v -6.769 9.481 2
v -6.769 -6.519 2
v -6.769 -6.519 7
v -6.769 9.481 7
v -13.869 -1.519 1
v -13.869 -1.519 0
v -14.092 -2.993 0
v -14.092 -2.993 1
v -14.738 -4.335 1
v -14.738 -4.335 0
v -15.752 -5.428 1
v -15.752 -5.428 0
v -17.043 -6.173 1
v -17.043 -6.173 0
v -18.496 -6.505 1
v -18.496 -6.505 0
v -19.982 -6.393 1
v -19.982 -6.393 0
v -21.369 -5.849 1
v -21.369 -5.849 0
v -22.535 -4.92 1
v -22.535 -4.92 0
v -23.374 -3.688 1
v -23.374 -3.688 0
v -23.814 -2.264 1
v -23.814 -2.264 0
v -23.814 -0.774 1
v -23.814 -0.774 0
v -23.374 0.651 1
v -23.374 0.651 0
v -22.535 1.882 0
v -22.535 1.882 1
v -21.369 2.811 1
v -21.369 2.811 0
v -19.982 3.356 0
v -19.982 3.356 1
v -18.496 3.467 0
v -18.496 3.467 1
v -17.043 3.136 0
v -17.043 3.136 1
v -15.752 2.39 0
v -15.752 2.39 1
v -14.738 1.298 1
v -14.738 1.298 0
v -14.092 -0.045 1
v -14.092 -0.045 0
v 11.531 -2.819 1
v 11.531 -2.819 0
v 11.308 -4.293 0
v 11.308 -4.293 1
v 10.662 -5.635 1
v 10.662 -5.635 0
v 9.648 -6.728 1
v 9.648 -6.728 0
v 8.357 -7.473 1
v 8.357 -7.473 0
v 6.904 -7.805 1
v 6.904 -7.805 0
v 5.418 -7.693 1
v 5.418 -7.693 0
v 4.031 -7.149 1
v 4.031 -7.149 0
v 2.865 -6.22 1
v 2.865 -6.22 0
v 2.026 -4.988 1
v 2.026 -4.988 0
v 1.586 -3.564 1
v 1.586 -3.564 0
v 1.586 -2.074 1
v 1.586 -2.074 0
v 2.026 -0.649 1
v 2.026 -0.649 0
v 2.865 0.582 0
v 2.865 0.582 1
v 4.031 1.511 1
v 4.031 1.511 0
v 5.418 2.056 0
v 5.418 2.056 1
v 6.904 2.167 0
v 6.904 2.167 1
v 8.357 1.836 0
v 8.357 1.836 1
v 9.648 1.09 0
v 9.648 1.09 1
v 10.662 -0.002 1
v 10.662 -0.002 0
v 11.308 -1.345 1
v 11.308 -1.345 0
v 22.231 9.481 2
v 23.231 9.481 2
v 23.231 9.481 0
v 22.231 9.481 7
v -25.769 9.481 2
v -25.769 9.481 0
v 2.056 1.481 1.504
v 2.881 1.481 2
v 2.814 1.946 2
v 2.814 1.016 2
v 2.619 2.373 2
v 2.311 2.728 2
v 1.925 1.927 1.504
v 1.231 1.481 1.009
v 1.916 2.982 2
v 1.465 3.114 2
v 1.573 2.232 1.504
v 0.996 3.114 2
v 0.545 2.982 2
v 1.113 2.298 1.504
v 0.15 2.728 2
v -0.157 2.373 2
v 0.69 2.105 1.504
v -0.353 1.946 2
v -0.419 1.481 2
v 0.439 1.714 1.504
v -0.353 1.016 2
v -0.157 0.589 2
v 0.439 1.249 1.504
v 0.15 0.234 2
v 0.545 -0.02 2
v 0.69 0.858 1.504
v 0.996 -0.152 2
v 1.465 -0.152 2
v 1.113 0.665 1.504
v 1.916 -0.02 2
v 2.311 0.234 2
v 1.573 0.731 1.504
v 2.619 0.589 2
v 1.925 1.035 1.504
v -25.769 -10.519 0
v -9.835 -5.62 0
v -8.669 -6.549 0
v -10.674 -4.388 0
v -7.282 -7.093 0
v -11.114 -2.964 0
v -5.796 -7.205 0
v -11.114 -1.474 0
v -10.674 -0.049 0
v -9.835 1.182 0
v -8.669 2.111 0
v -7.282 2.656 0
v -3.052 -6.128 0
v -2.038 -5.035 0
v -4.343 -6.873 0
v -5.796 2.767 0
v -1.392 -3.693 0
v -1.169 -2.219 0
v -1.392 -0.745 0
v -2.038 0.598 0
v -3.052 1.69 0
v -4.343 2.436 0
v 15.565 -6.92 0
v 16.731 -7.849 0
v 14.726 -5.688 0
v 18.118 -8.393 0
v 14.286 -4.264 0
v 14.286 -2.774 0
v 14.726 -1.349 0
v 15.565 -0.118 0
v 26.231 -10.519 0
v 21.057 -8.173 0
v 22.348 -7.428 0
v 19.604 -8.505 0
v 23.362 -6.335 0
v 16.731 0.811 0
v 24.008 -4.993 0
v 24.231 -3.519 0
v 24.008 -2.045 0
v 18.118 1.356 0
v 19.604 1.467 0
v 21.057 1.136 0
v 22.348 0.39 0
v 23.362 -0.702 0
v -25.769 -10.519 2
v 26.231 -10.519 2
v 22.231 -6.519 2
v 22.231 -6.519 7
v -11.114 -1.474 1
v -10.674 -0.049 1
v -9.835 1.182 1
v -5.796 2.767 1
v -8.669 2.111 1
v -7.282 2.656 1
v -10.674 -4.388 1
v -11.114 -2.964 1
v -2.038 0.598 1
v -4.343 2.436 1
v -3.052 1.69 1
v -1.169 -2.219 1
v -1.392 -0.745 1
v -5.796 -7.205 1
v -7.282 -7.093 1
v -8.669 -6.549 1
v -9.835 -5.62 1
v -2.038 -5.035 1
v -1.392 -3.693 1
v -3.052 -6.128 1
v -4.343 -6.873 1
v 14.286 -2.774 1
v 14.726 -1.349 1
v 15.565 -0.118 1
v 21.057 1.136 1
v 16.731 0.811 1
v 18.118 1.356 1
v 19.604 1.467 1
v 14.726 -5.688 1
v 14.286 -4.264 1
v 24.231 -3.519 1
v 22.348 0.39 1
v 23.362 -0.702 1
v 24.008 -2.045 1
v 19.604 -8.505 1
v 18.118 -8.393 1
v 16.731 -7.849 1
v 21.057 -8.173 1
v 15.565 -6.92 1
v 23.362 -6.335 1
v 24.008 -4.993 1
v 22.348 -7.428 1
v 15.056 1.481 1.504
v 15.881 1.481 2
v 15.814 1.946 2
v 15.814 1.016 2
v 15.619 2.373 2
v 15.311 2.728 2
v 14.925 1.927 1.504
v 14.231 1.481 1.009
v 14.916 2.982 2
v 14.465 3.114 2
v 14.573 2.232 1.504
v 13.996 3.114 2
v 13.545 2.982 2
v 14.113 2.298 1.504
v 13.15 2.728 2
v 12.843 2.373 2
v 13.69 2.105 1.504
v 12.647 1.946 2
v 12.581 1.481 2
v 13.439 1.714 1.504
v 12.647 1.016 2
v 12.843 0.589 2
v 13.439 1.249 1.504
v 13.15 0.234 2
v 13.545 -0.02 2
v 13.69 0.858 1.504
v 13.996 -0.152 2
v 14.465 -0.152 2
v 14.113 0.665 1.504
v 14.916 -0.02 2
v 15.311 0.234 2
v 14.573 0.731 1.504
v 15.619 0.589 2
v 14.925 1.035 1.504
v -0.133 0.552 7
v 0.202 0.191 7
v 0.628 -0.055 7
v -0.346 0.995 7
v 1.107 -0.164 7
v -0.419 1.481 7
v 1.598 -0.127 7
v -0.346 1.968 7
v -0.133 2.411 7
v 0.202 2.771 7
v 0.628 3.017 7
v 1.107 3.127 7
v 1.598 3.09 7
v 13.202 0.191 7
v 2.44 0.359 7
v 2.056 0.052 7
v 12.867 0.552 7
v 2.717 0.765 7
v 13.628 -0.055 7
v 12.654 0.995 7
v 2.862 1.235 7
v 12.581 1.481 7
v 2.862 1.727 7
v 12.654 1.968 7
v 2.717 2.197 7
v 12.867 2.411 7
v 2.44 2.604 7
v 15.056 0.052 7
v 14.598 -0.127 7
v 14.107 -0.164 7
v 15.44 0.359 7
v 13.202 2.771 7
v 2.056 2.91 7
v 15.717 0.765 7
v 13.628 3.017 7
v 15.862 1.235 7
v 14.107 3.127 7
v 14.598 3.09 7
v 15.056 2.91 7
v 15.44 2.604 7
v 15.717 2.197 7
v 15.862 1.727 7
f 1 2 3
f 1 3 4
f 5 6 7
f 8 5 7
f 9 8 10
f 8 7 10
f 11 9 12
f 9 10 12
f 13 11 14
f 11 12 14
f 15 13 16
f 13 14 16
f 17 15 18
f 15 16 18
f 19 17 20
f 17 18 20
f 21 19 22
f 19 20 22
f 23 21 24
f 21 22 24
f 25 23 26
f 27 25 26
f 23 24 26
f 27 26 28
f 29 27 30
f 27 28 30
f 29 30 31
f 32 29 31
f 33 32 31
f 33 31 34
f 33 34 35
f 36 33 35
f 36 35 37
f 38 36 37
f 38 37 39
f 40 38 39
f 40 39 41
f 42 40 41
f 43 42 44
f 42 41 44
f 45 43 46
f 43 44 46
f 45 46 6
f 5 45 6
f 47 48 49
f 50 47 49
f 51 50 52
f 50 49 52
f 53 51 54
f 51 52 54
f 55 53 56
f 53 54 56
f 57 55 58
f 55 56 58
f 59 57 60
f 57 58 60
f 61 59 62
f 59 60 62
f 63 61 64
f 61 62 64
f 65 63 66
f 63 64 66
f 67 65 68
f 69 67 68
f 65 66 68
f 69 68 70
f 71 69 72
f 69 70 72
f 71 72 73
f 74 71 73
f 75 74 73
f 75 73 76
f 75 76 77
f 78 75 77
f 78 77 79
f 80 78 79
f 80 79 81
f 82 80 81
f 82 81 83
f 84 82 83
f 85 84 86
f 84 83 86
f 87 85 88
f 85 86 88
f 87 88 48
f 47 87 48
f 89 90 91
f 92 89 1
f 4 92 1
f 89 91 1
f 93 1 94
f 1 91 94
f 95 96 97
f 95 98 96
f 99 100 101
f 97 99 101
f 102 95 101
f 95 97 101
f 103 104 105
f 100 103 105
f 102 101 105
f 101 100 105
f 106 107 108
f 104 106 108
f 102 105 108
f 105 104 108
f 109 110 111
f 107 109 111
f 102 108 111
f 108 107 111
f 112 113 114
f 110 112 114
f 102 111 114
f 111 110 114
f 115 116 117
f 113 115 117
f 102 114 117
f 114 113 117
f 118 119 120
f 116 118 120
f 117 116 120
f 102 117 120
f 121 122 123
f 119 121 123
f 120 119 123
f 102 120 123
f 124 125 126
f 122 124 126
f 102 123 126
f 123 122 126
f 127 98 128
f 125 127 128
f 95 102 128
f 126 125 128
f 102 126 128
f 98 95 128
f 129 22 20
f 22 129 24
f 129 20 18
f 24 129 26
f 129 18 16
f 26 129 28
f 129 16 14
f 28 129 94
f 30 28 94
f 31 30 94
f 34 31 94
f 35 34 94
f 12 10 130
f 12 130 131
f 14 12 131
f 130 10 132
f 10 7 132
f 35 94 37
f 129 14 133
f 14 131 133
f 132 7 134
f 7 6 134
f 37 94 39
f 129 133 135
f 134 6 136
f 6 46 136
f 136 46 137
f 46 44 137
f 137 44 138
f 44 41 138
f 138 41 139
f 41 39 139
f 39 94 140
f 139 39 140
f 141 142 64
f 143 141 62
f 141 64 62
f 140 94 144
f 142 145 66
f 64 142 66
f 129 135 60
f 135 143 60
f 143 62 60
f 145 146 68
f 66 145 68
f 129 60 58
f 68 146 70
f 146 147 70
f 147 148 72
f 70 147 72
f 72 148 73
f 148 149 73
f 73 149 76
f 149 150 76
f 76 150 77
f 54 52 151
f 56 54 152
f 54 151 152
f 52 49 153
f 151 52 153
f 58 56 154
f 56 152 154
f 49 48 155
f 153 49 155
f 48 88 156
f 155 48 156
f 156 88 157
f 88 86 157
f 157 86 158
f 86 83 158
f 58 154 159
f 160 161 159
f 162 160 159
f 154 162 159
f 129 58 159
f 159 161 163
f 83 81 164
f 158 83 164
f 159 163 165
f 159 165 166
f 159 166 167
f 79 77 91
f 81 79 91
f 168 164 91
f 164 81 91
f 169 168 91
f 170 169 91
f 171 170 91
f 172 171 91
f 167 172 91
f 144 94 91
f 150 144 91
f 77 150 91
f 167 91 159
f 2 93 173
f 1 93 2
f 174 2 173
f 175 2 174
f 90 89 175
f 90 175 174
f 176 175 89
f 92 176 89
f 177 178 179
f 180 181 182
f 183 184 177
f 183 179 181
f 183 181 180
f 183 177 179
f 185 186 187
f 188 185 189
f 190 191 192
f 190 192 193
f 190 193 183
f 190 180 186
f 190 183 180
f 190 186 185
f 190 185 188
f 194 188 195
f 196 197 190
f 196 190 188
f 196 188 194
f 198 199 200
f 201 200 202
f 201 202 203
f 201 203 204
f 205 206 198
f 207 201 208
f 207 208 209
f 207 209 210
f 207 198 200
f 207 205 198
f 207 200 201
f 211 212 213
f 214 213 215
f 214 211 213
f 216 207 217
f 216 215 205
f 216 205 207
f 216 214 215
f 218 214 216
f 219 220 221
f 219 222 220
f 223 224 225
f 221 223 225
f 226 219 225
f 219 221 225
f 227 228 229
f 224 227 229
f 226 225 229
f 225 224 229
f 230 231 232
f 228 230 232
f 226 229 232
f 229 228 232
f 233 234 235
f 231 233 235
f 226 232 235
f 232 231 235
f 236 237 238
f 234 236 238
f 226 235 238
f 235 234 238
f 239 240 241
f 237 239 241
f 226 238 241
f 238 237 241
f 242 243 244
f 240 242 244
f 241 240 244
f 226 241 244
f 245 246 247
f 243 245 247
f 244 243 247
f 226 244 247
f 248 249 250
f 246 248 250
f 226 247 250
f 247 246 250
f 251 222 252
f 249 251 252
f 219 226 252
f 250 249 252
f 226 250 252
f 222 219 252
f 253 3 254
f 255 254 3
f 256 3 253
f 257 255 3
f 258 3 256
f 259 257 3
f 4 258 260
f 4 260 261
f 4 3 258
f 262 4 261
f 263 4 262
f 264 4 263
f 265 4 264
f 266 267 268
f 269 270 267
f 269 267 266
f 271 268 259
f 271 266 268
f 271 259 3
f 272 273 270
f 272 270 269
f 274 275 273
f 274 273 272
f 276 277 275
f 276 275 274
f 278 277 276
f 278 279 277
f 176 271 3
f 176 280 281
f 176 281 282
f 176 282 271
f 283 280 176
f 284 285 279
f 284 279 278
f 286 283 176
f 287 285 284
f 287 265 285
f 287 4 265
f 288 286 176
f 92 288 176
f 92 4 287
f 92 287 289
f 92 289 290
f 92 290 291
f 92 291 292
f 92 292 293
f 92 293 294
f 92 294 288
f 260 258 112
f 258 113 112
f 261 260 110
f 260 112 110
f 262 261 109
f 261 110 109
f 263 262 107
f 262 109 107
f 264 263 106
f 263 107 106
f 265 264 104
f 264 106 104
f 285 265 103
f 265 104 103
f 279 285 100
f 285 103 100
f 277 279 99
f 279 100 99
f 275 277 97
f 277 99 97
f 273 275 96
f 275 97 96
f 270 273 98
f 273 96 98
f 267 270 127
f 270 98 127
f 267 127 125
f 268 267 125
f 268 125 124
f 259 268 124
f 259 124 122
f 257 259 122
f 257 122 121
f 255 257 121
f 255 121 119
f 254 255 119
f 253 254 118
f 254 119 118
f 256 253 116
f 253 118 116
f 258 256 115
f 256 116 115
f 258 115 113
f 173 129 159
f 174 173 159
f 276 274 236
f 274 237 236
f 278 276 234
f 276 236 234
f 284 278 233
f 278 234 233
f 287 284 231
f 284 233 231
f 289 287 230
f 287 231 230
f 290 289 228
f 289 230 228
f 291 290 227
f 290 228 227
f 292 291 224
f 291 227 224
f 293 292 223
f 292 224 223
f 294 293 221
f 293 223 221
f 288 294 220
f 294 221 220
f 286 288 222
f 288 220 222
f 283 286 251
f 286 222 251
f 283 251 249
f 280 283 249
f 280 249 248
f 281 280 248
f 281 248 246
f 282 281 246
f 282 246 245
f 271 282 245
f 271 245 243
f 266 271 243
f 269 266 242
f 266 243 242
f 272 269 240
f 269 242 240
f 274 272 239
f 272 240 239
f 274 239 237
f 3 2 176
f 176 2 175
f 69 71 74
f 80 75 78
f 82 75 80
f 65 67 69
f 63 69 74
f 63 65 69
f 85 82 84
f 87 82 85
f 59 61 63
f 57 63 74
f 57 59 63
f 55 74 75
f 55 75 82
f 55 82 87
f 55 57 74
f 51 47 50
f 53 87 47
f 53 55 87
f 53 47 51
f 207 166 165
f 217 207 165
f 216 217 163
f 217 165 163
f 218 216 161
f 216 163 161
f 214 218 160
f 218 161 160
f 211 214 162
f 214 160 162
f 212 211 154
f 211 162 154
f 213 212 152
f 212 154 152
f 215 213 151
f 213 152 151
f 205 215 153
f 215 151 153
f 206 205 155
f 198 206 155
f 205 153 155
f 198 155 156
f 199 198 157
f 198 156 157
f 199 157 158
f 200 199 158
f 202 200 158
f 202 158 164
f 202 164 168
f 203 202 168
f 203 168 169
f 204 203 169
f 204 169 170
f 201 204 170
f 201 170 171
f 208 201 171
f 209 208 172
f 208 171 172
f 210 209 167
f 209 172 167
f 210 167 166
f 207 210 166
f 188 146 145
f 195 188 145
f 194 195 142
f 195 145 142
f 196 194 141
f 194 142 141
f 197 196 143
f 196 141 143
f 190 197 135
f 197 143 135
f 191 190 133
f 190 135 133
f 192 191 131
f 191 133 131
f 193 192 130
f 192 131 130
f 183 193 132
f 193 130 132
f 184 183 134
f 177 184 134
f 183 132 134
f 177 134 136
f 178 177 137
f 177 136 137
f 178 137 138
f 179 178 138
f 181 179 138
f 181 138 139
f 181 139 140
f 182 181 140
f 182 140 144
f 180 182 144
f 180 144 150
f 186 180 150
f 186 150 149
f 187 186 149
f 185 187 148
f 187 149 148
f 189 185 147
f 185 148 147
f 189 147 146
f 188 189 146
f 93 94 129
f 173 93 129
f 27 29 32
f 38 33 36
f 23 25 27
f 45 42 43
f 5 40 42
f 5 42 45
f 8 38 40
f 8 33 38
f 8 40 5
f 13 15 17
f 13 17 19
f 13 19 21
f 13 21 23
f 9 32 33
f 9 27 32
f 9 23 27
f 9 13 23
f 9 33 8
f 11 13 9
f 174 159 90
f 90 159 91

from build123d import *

# Parameters (mm, degrees)
F1_DEPTH = 2
F2_R     = 5
F3_DEPTH = 1
F4_W     = 29
F4_H     = 16
F5_DEPTH = 5
F7_D     = 3.3
F7_DEPTH = 5
F7_TIP   = 0.9914200214


with BuildPart() as f1:
    # F0 (on Top) → F1 (new body)
    with BuildSketch(Plane.XY):
        Polygon((23.2306010574, 9.4812756346), (-25.7693989426, 9.4812756346), (-25.7693989426, -10.5187243654), (26.2306010574, -10.5187243654), align=None)
    extrude(amount=F1_DEPTH)

    # F2 (on face) → F3 (cut)
    with BuildSketch(Plane(origin=(0, 0, 0), x_dir=(1, 0, 0), z_dir=(0, 0, -1))):
        with Locations((19.2306010574, 3.5187243654)):
            Circle(F2_R)
        with Locations((6.5306010574, 2.8187243654)):
            Circle(F2_R)
        with Locations((-6.1693989426, 2.2187243654)):
            Circle(F2_R)
        with Locations((-18.8693989426, 1.5187243654)):
            Circle(F2_R)
    extrude(amount=-F3_DEPTH, mode=Mode.SUBTRACT)

    # F4 (on face) → F5 (join)
    with BuildSketch(Plane.XY.offset(2)):
        with Locations((7.7306010574, 1.4812756346)):
            Rectangle(F4_W, F4_H)
    extrude(amount=F5_DEPTH)

    # F7
    with Locations(Plane.XY.offset(7)):
        with Locations((1.2306010574, 1.4812756346), (14.2306010574, 1.4812756346)):
            Hole(F7_D / 2, depth=F7_DEPTH)
            with Locations((0, 0, -(F7_DEPTH + F7_TIP / 2))):  # 118° drill point
                Cone(0, F7_D / 2, F7_TIP, mode=Mode.SUBTRACT)


solid = f1.part
